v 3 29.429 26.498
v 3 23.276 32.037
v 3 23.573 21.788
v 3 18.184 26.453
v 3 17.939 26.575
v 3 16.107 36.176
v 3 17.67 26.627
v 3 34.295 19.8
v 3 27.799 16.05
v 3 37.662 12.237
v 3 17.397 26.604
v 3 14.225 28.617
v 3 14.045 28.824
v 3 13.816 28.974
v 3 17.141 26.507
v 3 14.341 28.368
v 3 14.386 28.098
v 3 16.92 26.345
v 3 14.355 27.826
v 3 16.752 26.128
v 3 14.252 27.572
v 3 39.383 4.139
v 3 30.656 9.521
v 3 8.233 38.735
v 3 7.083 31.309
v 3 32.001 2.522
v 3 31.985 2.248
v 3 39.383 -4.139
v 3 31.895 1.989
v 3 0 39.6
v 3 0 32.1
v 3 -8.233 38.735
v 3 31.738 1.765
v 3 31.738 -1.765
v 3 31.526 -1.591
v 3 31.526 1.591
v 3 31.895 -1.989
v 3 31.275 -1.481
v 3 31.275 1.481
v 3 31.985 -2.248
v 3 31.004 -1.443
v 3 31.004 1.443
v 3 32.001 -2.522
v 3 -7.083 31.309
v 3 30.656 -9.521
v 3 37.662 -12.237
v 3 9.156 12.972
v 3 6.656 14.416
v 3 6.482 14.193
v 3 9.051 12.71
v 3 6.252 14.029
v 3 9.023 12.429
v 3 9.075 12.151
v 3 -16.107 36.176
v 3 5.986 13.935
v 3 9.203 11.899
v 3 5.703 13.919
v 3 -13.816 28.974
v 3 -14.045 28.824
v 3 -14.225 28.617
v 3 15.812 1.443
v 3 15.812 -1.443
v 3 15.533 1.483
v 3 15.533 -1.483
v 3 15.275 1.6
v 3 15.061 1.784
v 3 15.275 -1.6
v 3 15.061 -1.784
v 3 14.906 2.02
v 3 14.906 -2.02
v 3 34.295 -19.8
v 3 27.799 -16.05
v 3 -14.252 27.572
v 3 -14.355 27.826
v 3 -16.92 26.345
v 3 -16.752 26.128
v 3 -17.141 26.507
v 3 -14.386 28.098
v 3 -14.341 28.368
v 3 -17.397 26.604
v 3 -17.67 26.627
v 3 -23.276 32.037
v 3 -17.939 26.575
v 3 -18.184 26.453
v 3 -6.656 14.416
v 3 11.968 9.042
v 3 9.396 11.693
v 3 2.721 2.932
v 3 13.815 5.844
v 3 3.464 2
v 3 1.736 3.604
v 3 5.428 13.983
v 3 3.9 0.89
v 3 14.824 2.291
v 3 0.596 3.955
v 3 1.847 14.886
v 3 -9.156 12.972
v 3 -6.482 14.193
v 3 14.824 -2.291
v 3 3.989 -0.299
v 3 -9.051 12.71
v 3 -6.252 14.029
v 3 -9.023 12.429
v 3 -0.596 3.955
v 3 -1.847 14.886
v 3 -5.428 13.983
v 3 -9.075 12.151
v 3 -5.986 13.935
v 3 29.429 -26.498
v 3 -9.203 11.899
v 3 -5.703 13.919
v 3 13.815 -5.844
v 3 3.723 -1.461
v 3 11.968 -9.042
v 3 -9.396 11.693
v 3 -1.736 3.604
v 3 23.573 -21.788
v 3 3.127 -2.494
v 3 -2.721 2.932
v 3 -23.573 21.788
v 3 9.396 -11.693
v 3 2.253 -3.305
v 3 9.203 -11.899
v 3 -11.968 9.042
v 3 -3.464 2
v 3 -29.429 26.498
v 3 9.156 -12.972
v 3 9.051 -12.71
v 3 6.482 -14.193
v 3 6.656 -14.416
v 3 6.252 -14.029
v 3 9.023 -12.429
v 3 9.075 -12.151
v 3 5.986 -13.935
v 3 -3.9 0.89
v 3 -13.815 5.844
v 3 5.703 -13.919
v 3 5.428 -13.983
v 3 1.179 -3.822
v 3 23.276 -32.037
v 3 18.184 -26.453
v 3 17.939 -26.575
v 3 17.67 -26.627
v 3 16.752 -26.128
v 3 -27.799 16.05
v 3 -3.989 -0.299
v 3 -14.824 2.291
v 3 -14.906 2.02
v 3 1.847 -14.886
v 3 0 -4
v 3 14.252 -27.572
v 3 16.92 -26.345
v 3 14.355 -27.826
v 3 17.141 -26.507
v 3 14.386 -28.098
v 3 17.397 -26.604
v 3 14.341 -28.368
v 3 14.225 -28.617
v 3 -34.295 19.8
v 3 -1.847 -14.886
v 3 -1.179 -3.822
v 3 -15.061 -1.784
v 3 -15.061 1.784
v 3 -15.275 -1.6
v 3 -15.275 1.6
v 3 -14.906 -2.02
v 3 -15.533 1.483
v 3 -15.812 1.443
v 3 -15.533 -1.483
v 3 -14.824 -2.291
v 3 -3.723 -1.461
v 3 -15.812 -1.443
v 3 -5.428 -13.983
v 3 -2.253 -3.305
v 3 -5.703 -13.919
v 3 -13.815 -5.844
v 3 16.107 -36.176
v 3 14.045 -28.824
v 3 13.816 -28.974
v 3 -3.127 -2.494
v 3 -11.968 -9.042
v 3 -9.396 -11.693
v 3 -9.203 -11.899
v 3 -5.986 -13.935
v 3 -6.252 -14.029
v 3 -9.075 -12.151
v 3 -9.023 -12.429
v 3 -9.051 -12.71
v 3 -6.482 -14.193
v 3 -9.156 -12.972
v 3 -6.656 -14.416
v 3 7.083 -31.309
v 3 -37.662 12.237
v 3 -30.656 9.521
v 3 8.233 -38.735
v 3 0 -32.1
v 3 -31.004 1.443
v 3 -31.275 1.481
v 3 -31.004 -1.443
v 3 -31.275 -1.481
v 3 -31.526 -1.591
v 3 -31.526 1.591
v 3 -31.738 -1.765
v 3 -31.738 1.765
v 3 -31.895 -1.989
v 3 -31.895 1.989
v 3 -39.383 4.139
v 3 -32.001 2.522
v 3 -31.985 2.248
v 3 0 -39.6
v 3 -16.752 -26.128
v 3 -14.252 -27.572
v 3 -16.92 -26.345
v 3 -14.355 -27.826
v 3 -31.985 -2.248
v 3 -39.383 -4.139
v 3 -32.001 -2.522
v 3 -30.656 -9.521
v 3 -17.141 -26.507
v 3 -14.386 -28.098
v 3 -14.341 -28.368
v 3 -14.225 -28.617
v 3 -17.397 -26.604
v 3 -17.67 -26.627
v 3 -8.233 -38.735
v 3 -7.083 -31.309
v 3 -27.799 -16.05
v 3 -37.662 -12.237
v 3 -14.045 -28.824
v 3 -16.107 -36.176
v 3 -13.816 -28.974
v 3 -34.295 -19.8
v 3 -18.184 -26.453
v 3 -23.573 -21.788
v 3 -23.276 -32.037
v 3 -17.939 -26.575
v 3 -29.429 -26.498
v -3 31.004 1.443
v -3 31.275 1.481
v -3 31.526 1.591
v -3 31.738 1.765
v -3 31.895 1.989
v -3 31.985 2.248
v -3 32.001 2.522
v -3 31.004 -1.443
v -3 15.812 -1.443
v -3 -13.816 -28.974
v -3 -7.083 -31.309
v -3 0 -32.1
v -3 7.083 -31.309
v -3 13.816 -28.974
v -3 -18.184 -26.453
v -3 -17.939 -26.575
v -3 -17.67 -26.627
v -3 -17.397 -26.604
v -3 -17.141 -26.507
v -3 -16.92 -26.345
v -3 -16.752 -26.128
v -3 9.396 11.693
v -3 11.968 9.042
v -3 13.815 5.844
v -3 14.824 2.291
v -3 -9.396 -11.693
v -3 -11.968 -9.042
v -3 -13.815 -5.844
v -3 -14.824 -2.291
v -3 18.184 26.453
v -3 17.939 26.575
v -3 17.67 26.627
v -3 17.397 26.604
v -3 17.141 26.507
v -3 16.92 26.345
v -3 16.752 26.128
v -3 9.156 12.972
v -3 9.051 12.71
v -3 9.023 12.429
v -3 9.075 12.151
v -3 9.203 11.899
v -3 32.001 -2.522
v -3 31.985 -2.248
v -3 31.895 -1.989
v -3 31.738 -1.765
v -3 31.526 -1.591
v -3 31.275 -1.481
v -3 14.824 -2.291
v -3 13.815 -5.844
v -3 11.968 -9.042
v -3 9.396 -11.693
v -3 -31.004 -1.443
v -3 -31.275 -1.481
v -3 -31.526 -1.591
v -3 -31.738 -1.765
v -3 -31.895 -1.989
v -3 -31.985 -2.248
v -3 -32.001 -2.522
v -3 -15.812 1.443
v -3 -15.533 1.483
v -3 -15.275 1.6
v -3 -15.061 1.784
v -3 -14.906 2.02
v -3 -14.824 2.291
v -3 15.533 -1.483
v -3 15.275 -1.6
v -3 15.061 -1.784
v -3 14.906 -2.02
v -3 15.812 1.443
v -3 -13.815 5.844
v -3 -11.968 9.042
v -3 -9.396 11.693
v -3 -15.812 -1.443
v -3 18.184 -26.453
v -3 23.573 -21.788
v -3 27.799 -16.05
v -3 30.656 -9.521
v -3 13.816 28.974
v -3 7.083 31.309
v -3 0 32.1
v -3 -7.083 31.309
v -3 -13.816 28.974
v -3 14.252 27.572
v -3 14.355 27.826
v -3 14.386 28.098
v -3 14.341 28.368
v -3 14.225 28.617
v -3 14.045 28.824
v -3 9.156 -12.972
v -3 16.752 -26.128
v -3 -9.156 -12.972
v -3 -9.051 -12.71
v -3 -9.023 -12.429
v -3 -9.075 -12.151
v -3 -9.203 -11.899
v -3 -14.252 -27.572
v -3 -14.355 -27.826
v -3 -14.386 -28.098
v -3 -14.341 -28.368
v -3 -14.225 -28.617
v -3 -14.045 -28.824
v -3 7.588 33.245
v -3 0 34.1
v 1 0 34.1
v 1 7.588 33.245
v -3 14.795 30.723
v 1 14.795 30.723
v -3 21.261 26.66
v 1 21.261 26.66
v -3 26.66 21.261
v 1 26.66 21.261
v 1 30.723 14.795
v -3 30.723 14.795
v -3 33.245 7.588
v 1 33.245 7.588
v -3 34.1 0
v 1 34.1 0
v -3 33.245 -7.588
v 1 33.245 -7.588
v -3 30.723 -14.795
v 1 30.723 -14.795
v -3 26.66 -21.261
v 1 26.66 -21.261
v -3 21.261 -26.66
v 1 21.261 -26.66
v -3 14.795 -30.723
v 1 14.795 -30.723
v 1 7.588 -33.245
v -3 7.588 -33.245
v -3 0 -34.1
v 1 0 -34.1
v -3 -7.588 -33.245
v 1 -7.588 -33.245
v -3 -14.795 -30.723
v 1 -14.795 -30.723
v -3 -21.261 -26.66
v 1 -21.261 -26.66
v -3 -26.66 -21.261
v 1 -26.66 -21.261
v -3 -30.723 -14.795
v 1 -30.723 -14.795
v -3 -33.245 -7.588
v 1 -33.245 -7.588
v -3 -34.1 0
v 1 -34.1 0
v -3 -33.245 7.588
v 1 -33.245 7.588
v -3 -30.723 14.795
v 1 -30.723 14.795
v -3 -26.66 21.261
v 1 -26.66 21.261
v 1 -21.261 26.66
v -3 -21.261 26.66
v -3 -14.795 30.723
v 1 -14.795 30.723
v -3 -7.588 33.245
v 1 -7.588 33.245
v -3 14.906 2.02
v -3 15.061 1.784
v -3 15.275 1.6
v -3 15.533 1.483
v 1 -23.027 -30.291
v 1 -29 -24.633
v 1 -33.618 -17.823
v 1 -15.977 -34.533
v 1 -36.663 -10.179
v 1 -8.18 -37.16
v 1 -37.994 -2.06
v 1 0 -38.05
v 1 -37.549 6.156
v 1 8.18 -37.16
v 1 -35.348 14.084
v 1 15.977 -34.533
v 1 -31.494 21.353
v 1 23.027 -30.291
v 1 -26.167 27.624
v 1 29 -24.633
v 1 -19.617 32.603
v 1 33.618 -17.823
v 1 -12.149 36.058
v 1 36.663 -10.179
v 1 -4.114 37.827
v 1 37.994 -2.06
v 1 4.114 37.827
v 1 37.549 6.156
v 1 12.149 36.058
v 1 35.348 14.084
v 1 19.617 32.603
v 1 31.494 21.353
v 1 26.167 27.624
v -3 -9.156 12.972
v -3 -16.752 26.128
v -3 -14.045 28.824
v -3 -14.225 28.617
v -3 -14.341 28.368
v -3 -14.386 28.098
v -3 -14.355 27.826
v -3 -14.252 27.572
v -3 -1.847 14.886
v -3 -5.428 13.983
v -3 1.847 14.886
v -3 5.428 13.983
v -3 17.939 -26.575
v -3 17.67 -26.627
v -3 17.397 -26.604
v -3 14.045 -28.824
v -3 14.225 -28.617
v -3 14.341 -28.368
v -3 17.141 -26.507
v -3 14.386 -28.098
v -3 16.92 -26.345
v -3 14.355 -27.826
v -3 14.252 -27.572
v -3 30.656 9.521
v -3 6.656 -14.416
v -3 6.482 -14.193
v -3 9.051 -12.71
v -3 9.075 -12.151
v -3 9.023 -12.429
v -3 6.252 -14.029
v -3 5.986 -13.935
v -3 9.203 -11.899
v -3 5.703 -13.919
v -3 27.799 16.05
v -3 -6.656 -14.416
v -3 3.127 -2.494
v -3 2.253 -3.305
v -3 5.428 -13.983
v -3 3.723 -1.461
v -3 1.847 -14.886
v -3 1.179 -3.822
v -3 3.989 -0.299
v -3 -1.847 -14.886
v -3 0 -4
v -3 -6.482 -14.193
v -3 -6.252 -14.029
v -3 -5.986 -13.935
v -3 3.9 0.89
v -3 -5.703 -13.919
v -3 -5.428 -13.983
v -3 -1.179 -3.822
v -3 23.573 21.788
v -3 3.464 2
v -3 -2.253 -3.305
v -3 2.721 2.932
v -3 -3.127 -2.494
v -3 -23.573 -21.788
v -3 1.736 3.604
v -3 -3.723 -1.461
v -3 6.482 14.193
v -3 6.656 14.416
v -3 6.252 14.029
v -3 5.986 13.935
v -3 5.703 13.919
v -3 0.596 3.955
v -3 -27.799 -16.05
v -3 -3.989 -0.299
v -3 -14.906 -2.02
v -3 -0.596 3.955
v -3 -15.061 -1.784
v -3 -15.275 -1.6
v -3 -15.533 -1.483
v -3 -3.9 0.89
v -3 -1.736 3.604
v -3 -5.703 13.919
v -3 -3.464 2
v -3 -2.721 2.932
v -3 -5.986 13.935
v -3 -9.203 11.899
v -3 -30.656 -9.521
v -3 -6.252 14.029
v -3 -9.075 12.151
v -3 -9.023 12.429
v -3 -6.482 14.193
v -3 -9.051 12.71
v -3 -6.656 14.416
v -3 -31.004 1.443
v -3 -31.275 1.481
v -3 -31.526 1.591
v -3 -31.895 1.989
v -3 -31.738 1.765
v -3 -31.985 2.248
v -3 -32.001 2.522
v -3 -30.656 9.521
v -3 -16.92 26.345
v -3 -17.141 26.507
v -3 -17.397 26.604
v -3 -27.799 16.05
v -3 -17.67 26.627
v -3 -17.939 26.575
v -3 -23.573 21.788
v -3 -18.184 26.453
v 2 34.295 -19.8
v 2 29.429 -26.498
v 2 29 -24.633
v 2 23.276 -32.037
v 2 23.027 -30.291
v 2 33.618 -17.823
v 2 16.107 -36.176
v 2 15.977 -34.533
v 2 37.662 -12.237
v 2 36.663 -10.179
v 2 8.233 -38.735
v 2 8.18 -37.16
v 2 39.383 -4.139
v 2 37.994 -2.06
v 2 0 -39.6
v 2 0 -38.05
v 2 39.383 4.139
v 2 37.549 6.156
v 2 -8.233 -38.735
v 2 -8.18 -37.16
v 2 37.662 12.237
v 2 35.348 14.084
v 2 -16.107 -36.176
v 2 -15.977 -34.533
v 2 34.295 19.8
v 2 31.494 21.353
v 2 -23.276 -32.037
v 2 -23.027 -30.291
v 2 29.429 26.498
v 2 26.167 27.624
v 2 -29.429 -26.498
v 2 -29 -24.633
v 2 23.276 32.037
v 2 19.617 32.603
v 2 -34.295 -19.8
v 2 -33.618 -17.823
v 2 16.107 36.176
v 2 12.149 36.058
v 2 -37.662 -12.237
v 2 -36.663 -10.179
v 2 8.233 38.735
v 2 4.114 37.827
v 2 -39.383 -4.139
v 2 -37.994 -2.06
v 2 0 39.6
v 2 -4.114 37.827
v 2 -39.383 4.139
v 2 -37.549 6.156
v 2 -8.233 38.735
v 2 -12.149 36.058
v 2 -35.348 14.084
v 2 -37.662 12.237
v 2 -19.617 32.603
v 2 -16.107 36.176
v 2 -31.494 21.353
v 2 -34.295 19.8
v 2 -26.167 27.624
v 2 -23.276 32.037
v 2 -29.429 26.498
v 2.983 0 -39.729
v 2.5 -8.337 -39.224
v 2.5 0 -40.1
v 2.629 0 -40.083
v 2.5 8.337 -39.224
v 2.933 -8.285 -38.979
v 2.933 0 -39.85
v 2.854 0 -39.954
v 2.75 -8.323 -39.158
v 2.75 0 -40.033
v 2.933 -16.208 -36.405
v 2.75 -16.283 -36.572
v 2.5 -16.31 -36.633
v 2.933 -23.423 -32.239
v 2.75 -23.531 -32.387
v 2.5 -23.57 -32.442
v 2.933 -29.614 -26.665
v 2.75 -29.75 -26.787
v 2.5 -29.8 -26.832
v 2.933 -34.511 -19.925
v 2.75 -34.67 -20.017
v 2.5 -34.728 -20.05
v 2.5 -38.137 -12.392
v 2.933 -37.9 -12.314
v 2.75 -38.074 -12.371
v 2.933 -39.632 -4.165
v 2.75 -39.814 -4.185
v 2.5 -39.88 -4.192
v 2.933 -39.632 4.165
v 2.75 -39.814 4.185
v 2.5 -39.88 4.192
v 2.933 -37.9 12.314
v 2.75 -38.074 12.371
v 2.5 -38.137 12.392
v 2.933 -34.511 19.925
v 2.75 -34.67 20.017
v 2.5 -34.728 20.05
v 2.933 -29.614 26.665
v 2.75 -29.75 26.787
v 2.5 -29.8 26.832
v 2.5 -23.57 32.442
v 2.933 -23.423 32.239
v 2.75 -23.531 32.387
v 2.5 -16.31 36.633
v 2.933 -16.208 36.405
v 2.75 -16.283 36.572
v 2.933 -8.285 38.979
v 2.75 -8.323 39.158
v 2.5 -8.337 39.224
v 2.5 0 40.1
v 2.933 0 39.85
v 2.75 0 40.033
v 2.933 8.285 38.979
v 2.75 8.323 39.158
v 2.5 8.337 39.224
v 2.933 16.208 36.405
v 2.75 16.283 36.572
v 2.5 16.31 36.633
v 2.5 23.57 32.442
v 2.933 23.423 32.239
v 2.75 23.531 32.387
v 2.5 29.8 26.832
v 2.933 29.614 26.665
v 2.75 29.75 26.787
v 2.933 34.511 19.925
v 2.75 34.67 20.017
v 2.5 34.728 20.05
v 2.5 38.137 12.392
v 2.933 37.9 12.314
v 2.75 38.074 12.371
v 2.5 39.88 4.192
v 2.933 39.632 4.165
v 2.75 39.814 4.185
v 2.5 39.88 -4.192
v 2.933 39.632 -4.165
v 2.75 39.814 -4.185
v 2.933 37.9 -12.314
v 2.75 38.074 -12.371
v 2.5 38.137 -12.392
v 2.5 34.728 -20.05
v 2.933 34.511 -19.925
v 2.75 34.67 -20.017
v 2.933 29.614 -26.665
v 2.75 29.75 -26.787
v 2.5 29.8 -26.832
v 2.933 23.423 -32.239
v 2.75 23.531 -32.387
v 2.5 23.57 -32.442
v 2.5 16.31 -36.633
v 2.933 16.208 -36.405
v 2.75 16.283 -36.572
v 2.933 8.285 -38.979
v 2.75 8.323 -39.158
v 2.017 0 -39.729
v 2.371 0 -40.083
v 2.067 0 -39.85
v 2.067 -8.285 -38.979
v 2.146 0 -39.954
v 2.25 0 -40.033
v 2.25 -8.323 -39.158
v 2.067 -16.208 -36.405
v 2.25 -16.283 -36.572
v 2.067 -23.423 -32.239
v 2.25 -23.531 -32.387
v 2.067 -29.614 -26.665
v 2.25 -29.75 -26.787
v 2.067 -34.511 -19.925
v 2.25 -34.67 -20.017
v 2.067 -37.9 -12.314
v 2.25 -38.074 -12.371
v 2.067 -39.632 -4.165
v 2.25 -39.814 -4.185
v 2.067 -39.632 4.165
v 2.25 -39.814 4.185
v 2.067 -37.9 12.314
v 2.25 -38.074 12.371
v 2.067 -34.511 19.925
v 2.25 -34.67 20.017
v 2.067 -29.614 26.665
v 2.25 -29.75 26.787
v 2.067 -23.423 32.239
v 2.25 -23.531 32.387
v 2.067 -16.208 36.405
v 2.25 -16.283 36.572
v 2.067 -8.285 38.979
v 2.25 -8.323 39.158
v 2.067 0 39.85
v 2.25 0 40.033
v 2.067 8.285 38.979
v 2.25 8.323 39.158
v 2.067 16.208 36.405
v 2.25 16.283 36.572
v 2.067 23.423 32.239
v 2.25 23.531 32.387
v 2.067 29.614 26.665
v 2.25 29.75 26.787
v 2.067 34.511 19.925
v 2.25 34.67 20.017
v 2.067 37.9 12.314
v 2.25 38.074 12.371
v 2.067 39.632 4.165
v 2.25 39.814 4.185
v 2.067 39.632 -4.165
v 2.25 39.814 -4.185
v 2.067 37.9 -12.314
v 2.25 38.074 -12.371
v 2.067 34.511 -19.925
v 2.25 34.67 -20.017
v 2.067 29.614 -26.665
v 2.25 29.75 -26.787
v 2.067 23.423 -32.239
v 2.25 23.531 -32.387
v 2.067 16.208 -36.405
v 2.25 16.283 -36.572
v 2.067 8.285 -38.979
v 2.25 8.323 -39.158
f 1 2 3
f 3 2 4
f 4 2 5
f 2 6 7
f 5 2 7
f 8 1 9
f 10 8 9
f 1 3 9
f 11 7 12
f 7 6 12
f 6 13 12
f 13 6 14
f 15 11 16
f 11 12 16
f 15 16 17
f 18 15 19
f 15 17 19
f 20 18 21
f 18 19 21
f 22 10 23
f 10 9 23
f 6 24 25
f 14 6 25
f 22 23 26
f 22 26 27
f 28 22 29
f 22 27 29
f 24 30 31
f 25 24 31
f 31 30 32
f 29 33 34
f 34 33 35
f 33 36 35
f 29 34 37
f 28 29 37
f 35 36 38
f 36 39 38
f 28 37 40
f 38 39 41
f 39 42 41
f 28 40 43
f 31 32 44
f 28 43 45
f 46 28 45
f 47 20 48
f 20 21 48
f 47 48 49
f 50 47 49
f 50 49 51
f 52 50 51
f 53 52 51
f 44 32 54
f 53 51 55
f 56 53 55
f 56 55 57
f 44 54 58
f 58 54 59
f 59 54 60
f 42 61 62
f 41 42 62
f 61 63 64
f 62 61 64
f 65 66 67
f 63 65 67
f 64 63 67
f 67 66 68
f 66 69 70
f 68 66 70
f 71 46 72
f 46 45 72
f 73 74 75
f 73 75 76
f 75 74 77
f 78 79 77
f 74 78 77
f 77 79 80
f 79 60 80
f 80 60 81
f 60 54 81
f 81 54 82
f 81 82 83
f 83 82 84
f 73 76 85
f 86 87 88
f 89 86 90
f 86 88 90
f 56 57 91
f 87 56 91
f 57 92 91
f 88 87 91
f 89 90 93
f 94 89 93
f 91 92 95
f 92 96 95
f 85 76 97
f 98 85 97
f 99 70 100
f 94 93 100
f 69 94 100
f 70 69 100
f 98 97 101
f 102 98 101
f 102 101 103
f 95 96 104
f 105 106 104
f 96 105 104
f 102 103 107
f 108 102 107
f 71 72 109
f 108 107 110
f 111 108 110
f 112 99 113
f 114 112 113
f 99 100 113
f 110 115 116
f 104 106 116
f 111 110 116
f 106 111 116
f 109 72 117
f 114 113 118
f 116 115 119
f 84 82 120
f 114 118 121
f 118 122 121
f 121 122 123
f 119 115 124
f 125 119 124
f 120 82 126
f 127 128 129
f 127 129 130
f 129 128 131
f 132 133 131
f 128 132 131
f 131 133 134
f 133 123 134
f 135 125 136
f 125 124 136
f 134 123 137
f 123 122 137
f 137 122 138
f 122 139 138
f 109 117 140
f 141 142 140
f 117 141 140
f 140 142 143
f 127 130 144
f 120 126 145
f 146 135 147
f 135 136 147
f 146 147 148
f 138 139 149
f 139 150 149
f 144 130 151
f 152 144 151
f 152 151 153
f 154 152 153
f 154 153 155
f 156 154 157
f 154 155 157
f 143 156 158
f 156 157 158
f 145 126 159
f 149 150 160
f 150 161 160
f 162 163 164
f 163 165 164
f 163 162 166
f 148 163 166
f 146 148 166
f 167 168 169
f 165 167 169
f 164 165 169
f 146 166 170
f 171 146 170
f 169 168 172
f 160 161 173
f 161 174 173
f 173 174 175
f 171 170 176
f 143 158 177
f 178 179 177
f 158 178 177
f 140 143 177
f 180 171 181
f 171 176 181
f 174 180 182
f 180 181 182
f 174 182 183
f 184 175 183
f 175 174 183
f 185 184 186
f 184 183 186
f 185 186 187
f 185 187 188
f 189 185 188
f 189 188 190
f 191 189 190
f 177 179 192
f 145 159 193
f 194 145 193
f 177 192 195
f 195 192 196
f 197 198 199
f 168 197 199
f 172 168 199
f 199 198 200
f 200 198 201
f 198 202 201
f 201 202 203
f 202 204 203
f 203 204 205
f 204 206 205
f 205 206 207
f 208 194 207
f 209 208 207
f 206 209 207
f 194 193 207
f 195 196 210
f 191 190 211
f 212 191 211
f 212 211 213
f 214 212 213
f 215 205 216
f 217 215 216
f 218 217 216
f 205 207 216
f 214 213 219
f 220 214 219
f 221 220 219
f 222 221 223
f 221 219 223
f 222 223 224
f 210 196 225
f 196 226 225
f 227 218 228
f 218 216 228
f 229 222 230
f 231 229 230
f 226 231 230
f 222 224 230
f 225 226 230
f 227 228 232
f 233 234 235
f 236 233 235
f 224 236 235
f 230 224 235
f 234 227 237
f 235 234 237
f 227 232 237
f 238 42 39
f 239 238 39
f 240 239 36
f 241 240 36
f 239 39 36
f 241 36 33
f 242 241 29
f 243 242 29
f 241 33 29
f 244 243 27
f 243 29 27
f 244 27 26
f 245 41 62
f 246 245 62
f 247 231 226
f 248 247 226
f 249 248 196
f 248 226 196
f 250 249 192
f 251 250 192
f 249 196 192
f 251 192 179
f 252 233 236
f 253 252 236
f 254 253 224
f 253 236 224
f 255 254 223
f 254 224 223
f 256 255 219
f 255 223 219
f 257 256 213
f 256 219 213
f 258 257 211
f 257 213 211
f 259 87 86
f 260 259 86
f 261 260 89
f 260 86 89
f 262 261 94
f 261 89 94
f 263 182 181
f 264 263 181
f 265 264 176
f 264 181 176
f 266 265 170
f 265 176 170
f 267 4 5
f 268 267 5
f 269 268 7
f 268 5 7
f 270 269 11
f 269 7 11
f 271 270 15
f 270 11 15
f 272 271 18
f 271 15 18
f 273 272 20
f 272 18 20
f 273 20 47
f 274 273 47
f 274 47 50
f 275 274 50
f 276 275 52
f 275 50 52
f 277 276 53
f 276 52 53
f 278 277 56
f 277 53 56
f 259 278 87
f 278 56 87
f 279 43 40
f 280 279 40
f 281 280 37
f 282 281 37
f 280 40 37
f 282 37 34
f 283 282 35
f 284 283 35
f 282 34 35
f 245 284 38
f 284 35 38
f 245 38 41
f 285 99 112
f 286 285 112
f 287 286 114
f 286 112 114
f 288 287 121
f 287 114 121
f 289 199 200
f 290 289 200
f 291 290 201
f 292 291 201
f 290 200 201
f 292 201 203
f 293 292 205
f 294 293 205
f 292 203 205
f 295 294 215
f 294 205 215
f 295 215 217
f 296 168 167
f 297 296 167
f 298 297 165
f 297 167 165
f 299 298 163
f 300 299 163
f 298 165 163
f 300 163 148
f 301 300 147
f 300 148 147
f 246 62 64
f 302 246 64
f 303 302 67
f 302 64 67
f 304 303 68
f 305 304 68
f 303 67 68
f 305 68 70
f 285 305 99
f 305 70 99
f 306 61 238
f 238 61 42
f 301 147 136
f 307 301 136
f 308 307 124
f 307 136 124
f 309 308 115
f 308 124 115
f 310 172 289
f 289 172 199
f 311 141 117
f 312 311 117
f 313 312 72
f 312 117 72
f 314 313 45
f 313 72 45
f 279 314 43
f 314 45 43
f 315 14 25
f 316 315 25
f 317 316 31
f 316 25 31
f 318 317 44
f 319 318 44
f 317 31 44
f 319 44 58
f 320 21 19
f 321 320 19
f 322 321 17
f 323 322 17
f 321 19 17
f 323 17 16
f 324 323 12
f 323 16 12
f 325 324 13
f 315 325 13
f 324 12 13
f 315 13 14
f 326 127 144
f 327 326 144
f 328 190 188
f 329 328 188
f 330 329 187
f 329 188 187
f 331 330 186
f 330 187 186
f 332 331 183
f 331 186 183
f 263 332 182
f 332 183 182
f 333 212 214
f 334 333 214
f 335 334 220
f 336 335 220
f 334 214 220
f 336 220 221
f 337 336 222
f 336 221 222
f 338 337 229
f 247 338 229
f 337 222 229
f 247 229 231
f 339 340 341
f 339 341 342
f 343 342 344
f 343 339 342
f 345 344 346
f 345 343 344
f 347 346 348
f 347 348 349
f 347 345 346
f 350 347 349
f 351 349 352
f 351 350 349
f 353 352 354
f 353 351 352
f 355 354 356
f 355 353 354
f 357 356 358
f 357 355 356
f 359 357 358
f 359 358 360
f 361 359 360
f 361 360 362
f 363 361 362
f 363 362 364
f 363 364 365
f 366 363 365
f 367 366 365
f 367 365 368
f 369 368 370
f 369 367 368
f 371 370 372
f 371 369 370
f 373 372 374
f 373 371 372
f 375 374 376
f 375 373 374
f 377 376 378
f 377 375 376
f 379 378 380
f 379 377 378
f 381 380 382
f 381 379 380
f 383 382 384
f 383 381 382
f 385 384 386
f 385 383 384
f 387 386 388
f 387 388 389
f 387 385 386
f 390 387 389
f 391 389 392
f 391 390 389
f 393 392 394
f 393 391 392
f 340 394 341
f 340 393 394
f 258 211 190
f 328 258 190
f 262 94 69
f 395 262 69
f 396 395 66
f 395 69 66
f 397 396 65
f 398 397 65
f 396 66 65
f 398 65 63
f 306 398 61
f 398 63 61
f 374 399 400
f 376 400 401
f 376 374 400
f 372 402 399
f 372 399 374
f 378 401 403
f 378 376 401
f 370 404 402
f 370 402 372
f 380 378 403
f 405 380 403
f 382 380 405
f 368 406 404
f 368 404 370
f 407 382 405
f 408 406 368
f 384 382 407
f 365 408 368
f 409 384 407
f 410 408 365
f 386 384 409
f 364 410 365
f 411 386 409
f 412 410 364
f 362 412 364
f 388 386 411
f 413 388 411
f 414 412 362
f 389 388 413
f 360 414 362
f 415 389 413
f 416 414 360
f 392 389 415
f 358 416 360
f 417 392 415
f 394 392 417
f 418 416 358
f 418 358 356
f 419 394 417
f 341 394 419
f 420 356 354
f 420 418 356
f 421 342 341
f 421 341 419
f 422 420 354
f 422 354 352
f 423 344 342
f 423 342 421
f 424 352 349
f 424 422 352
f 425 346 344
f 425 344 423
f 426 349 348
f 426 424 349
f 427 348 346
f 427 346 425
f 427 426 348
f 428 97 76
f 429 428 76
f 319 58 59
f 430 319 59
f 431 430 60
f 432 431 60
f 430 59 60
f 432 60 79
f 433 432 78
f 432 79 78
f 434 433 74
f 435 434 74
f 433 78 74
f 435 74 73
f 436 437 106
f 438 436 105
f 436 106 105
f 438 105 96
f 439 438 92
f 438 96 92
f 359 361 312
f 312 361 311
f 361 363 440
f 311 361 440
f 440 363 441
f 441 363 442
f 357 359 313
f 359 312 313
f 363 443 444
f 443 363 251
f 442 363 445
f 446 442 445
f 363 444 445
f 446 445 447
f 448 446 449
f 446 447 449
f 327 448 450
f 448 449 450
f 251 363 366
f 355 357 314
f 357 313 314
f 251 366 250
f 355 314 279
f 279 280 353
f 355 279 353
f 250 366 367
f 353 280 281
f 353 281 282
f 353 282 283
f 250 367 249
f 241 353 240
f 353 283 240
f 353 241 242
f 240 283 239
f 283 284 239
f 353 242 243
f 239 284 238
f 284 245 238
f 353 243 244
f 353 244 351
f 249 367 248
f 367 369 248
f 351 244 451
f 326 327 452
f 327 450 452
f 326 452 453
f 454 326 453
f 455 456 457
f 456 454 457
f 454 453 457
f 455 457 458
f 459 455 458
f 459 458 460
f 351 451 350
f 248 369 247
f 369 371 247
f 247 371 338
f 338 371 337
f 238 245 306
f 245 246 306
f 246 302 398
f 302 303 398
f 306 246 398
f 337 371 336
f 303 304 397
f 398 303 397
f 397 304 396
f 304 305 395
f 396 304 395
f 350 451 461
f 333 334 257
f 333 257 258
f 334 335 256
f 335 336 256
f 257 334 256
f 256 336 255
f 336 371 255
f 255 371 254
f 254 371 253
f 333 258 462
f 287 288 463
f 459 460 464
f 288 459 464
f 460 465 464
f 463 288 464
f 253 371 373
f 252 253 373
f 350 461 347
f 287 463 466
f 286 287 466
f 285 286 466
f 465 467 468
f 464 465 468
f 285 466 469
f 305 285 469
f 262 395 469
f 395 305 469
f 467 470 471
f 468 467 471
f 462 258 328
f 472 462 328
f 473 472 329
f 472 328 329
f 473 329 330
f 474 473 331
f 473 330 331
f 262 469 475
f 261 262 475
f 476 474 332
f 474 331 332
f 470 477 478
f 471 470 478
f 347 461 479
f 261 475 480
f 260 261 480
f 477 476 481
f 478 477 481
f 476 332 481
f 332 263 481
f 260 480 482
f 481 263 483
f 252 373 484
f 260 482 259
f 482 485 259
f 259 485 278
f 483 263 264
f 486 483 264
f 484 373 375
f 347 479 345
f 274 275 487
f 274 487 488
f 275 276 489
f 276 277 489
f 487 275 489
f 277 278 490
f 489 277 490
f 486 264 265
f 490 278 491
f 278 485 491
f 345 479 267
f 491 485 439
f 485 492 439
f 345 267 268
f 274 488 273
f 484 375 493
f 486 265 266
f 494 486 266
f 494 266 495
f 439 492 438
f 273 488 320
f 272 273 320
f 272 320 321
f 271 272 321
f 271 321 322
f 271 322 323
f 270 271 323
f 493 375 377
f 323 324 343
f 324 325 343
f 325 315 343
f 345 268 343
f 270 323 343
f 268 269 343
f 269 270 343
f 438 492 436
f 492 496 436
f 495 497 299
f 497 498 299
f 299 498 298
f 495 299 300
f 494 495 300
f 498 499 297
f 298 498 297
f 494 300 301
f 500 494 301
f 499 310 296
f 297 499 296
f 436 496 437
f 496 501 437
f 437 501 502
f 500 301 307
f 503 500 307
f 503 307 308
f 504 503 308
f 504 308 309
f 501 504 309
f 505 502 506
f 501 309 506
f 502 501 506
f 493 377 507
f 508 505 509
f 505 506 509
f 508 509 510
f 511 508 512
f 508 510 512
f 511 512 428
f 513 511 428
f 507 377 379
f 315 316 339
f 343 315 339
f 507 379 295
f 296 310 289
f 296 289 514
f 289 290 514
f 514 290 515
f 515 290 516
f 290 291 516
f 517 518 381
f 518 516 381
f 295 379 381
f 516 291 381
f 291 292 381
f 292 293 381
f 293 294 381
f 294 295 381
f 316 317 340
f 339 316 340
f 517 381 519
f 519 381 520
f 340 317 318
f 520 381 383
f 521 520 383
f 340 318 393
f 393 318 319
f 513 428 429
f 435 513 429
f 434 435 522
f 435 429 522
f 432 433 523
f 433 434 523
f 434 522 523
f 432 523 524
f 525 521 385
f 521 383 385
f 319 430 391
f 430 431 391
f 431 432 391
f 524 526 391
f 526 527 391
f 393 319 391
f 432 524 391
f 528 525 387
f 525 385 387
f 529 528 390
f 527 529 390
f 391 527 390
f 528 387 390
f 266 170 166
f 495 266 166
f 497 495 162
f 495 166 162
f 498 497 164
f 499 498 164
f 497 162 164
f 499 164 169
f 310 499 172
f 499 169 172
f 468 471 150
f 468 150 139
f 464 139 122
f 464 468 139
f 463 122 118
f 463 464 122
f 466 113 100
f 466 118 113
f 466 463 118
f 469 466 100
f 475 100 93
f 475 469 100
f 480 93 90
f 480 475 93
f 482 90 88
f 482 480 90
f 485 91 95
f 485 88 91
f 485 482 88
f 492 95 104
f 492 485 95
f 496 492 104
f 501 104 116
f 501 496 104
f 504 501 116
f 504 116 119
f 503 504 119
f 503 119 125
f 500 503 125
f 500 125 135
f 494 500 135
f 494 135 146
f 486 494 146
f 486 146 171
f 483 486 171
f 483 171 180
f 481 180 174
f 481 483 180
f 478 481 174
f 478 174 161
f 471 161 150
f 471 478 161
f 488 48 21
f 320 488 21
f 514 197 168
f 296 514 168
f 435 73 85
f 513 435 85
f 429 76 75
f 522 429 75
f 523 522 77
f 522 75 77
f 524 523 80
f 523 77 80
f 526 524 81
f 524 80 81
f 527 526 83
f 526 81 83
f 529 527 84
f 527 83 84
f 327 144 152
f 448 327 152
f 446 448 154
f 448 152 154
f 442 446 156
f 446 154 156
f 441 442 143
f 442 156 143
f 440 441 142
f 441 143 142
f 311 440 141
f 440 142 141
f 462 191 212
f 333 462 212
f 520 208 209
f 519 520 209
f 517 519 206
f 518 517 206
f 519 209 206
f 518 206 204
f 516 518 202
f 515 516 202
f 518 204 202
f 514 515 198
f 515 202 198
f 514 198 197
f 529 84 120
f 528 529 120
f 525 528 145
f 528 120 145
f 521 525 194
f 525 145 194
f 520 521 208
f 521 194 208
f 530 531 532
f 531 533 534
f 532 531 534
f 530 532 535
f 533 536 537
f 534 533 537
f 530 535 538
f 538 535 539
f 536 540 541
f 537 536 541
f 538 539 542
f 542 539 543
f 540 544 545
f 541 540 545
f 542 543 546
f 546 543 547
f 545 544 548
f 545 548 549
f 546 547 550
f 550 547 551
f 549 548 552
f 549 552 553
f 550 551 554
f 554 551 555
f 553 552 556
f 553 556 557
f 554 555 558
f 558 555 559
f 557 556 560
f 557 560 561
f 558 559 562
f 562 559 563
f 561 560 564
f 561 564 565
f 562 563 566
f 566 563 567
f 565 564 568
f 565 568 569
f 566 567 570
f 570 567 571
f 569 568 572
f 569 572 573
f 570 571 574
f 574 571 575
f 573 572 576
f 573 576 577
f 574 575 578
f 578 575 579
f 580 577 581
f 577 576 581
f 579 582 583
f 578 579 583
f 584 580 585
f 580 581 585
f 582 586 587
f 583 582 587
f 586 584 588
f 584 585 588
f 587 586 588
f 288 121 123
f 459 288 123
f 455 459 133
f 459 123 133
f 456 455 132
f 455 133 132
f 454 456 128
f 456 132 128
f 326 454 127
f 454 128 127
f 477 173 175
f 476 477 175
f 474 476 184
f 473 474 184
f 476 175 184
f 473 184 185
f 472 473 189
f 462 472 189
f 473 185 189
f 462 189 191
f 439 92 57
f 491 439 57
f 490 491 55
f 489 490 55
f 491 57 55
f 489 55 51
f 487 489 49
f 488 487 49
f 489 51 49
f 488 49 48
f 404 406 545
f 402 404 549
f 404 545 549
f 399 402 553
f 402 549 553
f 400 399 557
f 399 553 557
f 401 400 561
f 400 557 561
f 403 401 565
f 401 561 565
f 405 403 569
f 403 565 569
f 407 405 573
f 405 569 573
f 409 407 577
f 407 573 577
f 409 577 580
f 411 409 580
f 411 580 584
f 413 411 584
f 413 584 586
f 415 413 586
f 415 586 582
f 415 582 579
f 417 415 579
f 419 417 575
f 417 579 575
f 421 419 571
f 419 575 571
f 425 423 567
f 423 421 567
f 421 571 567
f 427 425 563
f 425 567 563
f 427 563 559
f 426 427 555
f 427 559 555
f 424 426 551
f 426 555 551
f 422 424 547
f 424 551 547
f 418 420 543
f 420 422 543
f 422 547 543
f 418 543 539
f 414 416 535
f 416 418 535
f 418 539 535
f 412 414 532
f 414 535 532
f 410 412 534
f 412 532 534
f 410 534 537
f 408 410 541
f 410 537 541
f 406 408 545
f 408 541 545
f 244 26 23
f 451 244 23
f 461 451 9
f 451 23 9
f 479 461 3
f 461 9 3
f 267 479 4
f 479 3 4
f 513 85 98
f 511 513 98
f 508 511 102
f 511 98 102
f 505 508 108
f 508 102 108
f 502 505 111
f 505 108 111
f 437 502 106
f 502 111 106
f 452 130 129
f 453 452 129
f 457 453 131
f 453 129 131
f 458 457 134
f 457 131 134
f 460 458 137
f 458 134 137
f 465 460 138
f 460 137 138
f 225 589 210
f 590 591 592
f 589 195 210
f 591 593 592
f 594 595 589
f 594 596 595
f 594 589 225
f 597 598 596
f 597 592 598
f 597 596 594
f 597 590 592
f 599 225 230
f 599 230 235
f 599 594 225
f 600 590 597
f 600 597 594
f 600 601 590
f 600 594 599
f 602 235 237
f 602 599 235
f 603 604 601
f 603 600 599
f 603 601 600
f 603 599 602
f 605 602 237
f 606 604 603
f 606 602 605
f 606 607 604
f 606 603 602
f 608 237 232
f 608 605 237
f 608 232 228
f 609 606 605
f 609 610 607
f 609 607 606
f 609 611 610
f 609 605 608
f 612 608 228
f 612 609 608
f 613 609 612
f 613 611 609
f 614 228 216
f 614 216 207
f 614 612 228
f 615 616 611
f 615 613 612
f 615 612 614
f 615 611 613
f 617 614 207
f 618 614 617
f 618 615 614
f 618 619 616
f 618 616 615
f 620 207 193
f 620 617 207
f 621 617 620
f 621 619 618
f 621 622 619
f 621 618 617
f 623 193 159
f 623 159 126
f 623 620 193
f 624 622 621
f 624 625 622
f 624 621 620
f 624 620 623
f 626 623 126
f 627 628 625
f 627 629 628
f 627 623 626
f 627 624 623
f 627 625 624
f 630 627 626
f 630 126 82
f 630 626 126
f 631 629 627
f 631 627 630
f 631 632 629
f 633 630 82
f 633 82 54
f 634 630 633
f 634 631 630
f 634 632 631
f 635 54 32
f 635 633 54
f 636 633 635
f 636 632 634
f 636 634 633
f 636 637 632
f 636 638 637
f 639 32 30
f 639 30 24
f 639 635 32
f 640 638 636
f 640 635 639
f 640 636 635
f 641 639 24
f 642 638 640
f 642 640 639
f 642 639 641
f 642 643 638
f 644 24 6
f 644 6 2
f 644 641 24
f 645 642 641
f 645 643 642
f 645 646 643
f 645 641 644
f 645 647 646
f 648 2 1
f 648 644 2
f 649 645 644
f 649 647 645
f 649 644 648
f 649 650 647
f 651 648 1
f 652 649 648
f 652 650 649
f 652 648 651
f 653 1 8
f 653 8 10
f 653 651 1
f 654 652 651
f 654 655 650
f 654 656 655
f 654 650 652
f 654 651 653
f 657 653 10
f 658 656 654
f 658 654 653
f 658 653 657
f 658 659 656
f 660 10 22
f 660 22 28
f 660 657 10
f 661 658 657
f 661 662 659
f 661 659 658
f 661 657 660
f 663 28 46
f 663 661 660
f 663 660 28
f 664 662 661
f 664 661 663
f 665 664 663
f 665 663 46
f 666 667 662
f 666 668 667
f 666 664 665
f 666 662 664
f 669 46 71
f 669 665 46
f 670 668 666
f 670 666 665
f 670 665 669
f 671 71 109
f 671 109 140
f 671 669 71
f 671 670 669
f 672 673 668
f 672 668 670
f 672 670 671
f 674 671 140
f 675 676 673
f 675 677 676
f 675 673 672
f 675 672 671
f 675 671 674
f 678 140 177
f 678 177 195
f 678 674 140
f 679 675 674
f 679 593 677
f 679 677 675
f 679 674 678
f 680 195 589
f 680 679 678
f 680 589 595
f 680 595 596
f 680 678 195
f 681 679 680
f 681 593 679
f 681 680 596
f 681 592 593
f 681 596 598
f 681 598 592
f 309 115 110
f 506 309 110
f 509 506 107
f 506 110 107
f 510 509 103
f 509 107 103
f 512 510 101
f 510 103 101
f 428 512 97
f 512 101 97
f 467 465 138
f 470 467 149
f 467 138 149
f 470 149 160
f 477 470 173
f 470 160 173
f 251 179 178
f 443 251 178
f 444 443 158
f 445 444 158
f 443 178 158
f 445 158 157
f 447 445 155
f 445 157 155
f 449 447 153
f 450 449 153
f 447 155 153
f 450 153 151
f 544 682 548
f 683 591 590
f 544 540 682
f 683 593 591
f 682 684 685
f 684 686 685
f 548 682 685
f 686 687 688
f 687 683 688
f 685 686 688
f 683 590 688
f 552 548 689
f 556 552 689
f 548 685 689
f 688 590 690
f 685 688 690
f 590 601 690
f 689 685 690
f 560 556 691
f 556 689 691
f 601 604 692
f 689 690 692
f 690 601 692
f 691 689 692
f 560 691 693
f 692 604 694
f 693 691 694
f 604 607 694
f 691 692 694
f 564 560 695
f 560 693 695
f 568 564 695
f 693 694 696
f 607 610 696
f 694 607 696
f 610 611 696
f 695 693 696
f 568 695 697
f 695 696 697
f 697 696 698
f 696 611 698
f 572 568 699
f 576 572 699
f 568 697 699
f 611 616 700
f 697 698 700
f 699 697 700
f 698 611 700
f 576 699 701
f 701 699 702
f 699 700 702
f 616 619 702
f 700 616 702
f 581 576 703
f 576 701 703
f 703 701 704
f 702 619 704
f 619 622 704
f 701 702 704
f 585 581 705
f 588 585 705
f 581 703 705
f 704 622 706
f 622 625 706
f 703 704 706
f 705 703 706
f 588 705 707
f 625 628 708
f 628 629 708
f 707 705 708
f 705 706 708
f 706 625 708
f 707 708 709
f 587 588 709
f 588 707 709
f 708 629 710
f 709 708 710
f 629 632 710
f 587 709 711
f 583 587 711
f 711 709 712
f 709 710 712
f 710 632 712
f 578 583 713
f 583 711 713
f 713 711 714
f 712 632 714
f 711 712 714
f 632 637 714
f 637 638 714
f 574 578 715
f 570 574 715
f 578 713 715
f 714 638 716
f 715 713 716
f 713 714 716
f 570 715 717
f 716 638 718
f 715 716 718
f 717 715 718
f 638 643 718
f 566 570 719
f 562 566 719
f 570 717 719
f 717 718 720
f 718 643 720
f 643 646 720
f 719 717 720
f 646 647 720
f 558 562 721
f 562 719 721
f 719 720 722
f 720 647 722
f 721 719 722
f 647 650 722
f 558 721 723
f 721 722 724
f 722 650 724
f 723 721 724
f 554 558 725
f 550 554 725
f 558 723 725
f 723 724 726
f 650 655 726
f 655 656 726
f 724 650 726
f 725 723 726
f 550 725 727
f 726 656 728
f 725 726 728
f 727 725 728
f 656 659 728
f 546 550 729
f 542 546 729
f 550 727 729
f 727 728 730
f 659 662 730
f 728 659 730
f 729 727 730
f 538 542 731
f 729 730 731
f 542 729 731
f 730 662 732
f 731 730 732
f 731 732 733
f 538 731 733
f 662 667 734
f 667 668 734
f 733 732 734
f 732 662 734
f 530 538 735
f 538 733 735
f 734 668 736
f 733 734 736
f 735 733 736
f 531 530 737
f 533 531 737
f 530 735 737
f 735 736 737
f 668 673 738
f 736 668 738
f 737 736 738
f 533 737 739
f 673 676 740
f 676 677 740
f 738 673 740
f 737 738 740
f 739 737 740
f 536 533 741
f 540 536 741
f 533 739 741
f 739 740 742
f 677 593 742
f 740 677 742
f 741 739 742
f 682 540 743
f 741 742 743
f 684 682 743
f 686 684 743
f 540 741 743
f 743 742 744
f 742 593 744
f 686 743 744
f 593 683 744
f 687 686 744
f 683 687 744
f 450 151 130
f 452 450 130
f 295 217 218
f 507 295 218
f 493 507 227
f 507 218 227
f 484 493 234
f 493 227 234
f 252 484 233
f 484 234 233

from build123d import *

# Parameters (mm, degrees)
CUT_EXTRUDE2_DEPTH      = 58.026485075
FILLET1_R               = 0.5
CUT_EXTRUDE5_DEPTH      = 58.026485145
CUT_EXTRUDE5_DEPTH_BACK = 58.026485145
SKETCH7_R               = 4
SKETCH9_R               = 50
SKETCH9_R_2             = 34.1
CUT_EXTRUDE6_DEPTH      = 4


with BuildPart() as part:
    # Sketch1 → Revolve2 (revolve)
    with BuildSketch(Plane.XY, mode=Mode.PRIVATE) as revolve2_sk:
        Polygon((-3, 0), (-3, 38.05), (2, 38.05), (2, 40.1), (3, 40.1), (3, 0), align=None)
    revolve(revolve2_sk.sketch.rotate(Axis((3, 0, 0), (-1, 0, 0)), 90), axis=Axis((3, 0, 0), (-1, 0, 0)))

    # Sketch2 → Cut-Extrude2 (cut, through all)
    with BuildSketch(Plane.ZY.offset(-3)):
        with BuildLine():
            Line((14.415571014, 6.656167139), (27.571826318, 14.25193468))
            ThreePointArc((27.571826318, 14.25193468), (28.368418684, 14.340913448), (28.97445739, 13.816324366))
            ThreePointArc((28.97445739, 13.816324366), (32.1, 0), (28.97445739, -13.816324366))
            ThreePointArc((28.97445739, -13.816324366), (28.368418684, -14.340913448), (27.571826318, -14.25193468))
            Line((27.571826318, -14.25193468), (14.415571014, -6.656167139))
            ThreePointArc((14.415571014, -6.656167139), (13.972302174, -6.122171697), (13.983347826, -5.428257877))
            ThreePointArc((13.983347826, -5.428257877), (15, 0), (13.983347826, 5.428257877))
            ThreePointArc((13.983347826, 5.428257877), (13.972302174, 6.122171697), (14.415571014, 6.656167139))
        make_face()
        with BuildLine():
            Line((12.972195341, -9.156167139), (26.128450645, -16.75193468))
            ThreePointArc((26.128450645, -16.75193468), (26.603804702, -17.397314521), (26.452516582, -18.184453977))
            ThreePointArc((26.452516582, -18.184453977), (16.05, -27.799415461), (2.521940807, -32.000778343))
            ThreePointArc((2.521940807, -32.000778343), (1.764613982, -31.73822797), (1.443375673, -31.00386936))
            Line((1.443375673, -31.00386936), (1.443375673, -15.812334278))
            ThreePointArc((1.443375673, -15.812334278), (1.684194871, -15.161454481), (2.290664693, -14.824063386))
            ThreePointArc((2.290664693, -14.824063386), (7.5, -12.990381057), (11.692683133, -9.395805509))
            ThreePointArc((11.692683133, -9.395805509), (12.288107303, -9.039282784), (12.972195341, -9.156167139))
        make_face()
        with BuildLine():
            Line((-1.443375673, -15.812334278), (-1.443375673, -31.00386936))
            ThreePointArc((-1.443375673, -31.00386936), (-1.764613982, -31.73822797), (-2.521940807, -32.000778343))
            ThreePointArc((-2.521940807, -32.000778343), (-16.05, -27.799415461), (-26.452516582, -18.184453977))
            ThreePointArc((-26.452516582, -18.184453977), (-26.603804702, -17.397314521), (-26.128450645, -16.75193468))
            Line((-26.128450645, -16.75193468), (-12.972195341, -9.156167139))
            ThreePointArc((-12.972195341, -9.156167139), (-12.288107303, -9.039282784), (-11.692683133, -9.395805509))
            ThreePointArc((-11.692683133, -9.395805509), (-7.5, -12.990381057), (-2.290664693, -14.824063386))
            ThreePointArc((-2.290664693, -14.824063386), (-1.684194871, -15.161454481), (-1.443375673, -15.812334278))
        make_face()
        with BuildLine():
            Line((-14.415571014, -6.656167139), (-27.571826318, -14.25193468))
            ThreePointArc((-27.571826318, -14.25193468), (-28.368418684, -14.340913448), (-28.97445739, -13.816324366))
            ThreePointArc((-28.97445739, -13.816324366), (-32.1, 0), (-28.97445739, 13.816324366))
            ThreePointArc((-28.97445739, 13.816324366), (-28.368418684, 14.340913448), (-27.571826318, 14.25193468))
            Line((-27.571826318, 14.25193468), (-14.415571014, 6.656167139))
            ThreePointArc((-14.415571014, 6.656167139), (-13.972302174, 6.122171697), (-13.983347826, 5.428257877))
            ThreePointArc((-13.983347826, 5.428257877), (-15, 0), (-13.983347826, -5.428257877))
            ThreePointArc((-13.983347826, -5.428257877), (-13.972302174, -6.122171697), (-14.415571014, -6.656167139))
        make_face()
        with BuildLine():
            Line((-12.972195341, 9.156167139), (-26.128450645, 16.75193468))
            ThreePointArc((-26.128450645, 16.75193468), (-26.603804702, 17.397314521), (-26.452516582, 18.184453977))
            ThreePointArc((-26.452516582, 18.184453977), (-16.05, 27.799415461), (-2.521940807, 32.000778343))
            ThreePointArc((-2.521940807, 32.000778343), (-1.764613982, 31.73822797), (-1.443375673, 31.00386936))
            Line((-1.443375673, 31.00386936), (-1.443375673, 15.812334278))
            ThreePointArc((-1.443375673, 15.812334278), (-1.684194871, 15.161454481), (-2.290664693, 14.824063386))
            ThreePointArc((-2.290664693, 14.824063386), (-7.5, 12.990381057), (-11.692683133, 9.395805509))
            ThreePointArc((-11.692683133, 9.395805509), (-12.288107303, 9.039282784), (-12.972195341, 9.156167139))
        make_face()
        with BuildLine():
            Line((1.443375673, 15.812334278), (1.443375673, 31.00386936))
            ThreePointArc((1.443375673, 31.00386936), (1.764613982, 31.73822797), (2.521940807, 32.000778343))
            ThreePointArc((2.521940807, 32.000778343), (16.05, 27.799415461), (26.452516582, 18.184453977))
            ThreePointArc((26.452516582, 18.184453977), (26.603804702, 17.397314521), (26.128450645, 16.75193468))
            Line((26.128450645, 16.75193468), (12.972195341, 9.156167139))
            ThreePointArc((12.972195341, 9.156167139), (12.288107303, 9.039282784), (11.692683133, 9.395805509))
            ThreePointArc((11.692683133, 9.395805509), (7.5, 12.990381057), (2.290664693, 14.824063386))
            ThreePointArc((2.290664693, 14.824063386), (1.684194871, 15.161454481), (1.443375673, 15.812334278))
        make_face()
    extrude(amount=CUT_EXTRUDE2_DEPTH, mode=Mode.SUBTRACT)

    # Fillet1
    fillet1_edges = [part.edges().sort_by_distance(p)[0] for p in [
        (3, 0, 40.1),
        (2, 0, 40.1),
    ]]
    fillet(fillet1_edges, radius=FILLET1_R - 0.0001)  # a hair under: the kernel refuses the full size

    # Sketch7 → Cut-Extrude5 (cut, two sides: drawn at the far end of the back side and taken through both)
    with BuildSketch(Plane(origin=(3, 0, 0), x_dir=(0, 0, -1), z_dir=(1, 0, 0)).offset(-CUT_EXTRUDE5_DEPTH_BACK)):
        Circle(SKETCH7_R)
    extrude(amount=CUT_EXTRUDE5_DEPTH + CUT_EXTRUDE5_DEPTH_BACK, mode=Mode.SUBTRACT)

    # Sketch9 → Cut-Extrude6 (cut)
    with BuildSketch(Plane.ZY.offset(3)):
        Circle(SKETCH9_R)
        Circle(SKETCH9_R_2, mode=Mode.SUBTRACT)
    extrude(amount=-CUT_EXTRUDE6_DEPTH, mode=Mode.SUBTRACT)


solid = part.part
